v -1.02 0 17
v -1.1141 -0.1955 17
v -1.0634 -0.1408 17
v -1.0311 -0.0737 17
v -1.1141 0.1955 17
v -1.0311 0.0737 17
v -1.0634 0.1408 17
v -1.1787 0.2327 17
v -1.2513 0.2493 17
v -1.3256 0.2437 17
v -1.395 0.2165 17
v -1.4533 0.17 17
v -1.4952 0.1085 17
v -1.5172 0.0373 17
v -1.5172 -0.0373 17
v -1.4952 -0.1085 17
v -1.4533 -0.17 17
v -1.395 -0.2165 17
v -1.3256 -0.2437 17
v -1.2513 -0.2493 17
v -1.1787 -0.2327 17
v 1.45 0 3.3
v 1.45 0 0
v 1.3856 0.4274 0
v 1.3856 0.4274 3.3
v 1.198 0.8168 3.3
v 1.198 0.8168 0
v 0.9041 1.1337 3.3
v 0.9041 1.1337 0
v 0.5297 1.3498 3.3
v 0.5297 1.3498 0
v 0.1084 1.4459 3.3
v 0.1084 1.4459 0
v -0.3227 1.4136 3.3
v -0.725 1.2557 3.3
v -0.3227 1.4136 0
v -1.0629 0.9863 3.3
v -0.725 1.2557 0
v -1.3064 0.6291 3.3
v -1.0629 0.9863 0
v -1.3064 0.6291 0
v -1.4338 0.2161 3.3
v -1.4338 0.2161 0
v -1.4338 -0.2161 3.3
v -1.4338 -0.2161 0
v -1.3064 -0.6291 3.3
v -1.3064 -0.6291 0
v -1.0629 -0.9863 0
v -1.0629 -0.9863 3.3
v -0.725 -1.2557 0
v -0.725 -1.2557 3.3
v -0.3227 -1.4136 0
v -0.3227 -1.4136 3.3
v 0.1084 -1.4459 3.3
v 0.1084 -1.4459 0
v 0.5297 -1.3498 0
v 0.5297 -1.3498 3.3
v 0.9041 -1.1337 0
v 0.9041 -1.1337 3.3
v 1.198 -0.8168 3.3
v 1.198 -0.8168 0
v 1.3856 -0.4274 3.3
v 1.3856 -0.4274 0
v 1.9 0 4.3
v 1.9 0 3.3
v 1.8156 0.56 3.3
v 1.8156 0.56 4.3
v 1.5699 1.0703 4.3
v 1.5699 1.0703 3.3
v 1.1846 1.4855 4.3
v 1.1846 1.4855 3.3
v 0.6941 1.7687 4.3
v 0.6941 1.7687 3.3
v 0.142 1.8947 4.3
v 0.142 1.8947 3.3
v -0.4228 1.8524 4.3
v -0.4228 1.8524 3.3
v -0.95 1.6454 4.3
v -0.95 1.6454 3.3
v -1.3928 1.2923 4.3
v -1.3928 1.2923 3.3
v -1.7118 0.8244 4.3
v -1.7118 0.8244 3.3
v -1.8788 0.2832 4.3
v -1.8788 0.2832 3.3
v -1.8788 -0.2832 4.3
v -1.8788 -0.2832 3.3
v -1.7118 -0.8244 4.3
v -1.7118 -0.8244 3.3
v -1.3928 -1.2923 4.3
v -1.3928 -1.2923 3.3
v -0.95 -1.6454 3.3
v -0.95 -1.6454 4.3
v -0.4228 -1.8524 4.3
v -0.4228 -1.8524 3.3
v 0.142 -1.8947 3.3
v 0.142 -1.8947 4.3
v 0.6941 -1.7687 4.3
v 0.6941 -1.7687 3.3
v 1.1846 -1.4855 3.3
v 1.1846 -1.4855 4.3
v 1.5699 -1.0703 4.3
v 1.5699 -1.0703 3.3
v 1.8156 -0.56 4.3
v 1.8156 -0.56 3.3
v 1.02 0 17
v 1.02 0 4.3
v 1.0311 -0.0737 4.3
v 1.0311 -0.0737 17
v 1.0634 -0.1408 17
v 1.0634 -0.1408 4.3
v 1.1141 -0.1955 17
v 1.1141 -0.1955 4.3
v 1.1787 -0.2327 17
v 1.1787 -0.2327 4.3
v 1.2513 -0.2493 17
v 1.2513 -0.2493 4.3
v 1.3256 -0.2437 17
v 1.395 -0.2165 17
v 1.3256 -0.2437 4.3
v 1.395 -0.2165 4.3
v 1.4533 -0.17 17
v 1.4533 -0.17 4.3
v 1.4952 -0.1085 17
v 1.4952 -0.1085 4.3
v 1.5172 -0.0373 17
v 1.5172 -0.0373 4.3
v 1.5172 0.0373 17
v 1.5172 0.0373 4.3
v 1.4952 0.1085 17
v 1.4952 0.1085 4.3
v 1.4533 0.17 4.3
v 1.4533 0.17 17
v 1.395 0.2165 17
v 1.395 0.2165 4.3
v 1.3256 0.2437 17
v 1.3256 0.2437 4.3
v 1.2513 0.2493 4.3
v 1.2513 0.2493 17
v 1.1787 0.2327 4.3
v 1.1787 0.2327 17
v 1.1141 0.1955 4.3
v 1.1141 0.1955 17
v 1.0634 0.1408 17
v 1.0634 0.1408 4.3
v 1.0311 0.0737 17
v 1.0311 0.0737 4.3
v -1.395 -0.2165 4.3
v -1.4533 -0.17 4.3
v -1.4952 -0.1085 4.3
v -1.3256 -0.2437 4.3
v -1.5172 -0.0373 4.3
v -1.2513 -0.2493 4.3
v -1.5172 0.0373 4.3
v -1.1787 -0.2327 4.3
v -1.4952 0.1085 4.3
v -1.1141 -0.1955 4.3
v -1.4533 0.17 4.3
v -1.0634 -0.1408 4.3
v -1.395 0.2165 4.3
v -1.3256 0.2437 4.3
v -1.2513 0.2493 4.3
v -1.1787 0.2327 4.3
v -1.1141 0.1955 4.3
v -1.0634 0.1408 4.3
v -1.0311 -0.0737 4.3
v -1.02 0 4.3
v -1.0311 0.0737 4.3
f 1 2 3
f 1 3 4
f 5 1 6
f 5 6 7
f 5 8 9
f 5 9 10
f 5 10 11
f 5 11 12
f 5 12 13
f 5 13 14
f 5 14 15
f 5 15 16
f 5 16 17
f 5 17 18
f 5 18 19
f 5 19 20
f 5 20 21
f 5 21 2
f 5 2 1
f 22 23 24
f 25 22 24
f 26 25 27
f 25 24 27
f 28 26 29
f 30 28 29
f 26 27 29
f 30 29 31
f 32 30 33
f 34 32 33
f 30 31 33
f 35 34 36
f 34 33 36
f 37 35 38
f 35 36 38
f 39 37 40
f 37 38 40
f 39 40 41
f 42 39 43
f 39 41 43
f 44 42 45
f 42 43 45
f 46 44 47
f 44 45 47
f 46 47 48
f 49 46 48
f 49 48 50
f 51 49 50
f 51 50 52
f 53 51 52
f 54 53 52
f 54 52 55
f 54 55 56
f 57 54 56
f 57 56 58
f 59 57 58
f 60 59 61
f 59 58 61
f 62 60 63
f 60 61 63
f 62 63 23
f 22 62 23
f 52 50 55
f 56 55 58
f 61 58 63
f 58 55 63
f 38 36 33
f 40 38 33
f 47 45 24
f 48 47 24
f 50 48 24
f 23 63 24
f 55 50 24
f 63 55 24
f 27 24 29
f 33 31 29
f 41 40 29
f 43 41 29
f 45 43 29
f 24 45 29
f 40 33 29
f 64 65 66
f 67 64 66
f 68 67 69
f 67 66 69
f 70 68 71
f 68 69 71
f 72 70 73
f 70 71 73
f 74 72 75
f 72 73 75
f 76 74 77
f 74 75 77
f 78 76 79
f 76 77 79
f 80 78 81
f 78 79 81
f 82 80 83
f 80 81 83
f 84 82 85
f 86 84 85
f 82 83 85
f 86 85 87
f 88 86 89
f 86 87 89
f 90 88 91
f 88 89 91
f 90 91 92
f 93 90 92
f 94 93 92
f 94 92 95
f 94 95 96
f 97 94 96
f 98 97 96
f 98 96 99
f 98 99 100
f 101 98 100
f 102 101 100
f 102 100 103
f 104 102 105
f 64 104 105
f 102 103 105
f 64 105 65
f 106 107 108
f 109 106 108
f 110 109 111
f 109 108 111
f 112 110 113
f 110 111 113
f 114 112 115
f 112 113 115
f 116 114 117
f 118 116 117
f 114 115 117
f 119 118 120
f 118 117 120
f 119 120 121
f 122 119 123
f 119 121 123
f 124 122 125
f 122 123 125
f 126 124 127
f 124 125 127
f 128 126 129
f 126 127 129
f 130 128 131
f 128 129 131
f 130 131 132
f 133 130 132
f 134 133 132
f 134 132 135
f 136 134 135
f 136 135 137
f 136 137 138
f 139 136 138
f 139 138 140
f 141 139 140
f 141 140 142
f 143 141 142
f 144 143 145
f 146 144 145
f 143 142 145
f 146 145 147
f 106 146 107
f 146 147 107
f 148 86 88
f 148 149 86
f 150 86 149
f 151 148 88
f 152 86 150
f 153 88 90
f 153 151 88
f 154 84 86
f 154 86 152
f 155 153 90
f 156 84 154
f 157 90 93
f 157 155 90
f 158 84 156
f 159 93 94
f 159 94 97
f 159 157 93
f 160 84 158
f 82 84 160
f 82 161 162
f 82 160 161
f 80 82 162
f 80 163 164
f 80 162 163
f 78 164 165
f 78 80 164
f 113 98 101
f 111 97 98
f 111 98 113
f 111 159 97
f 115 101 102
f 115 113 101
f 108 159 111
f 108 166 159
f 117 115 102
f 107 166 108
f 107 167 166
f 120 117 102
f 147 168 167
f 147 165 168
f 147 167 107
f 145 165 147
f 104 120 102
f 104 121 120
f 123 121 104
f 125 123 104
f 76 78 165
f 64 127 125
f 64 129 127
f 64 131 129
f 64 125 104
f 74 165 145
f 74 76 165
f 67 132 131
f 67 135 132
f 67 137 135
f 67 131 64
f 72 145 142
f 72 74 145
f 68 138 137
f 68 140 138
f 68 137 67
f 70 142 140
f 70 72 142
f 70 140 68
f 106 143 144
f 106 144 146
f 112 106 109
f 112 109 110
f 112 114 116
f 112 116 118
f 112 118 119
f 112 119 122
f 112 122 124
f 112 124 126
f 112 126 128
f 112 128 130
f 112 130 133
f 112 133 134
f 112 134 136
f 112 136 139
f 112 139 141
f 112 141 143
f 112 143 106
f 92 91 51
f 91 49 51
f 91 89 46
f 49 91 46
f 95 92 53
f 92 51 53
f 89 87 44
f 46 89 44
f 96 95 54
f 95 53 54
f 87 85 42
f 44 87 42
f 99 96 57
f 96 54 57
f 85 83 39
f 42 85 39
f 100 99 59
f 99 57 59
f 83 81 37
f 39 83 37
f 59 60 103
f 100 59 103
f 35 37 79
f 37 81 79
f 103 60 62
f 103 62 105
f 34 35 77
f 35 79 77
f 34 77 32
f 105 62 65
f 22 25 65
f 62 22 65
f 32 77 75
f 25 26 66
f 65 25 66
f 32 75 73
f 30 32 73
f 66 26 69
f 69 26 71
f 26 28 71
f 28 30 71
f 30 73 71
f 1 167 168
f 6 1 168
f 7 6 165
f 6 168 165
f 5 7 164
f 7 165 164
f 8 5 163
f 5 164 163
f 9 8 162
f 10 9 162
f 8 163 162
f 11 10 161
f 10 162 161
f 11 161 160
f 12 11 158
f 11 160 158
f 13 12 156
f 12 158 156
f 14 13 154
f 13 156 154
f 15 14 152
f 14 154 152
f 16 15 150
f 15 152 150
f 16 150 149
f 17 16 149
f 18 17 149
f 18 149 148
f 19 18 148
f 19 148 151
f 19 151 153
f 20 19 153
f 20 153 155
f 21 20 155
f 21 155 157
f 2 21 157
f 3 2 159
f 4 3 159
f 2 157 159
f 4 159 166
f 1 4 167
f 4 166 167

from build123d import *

# Parameters (mm, degrees)
SKETCH_1_R      = 1.45
EXTRUDE_1_DEPTH = 3.3
SKETCH_2_R      = 1.9
EXTRUDE_2_DEPTH = 1
SKETCH_3_R      = 0.25
EXTRUDE_3_DEPTH = 12.7


with BuildPart() as part:
    # 草图1 → 拉伸1 (new body)
    with BuildSketch(Plane.XY):
        Circle(SKETCH_1_R)
    extrude(amount=EXTRUDE_1_DEPTH)

    # 草图2 → 拉伸2 (add)
    with BuildSketch(Plane.XY.offset(3.3)):
        Circle(SKETCH_2_R)
    extrude(amount=EXTRUDE_2_DEPTH)

    # 草图3 → 拉伸3 (add)
    with BuildSketch(Plane.XY.offset(4.3)):
        with Locations((-1.27, 0)):
            Circle(SKETCH_3_R)
        with Locations(Location((1.27, 0, 0), (0, 0, 180))):
            Circle(SKETCH_3_R)
    extrude(amount=EXTRUDE_3_DEPTH)


solid = part.part
